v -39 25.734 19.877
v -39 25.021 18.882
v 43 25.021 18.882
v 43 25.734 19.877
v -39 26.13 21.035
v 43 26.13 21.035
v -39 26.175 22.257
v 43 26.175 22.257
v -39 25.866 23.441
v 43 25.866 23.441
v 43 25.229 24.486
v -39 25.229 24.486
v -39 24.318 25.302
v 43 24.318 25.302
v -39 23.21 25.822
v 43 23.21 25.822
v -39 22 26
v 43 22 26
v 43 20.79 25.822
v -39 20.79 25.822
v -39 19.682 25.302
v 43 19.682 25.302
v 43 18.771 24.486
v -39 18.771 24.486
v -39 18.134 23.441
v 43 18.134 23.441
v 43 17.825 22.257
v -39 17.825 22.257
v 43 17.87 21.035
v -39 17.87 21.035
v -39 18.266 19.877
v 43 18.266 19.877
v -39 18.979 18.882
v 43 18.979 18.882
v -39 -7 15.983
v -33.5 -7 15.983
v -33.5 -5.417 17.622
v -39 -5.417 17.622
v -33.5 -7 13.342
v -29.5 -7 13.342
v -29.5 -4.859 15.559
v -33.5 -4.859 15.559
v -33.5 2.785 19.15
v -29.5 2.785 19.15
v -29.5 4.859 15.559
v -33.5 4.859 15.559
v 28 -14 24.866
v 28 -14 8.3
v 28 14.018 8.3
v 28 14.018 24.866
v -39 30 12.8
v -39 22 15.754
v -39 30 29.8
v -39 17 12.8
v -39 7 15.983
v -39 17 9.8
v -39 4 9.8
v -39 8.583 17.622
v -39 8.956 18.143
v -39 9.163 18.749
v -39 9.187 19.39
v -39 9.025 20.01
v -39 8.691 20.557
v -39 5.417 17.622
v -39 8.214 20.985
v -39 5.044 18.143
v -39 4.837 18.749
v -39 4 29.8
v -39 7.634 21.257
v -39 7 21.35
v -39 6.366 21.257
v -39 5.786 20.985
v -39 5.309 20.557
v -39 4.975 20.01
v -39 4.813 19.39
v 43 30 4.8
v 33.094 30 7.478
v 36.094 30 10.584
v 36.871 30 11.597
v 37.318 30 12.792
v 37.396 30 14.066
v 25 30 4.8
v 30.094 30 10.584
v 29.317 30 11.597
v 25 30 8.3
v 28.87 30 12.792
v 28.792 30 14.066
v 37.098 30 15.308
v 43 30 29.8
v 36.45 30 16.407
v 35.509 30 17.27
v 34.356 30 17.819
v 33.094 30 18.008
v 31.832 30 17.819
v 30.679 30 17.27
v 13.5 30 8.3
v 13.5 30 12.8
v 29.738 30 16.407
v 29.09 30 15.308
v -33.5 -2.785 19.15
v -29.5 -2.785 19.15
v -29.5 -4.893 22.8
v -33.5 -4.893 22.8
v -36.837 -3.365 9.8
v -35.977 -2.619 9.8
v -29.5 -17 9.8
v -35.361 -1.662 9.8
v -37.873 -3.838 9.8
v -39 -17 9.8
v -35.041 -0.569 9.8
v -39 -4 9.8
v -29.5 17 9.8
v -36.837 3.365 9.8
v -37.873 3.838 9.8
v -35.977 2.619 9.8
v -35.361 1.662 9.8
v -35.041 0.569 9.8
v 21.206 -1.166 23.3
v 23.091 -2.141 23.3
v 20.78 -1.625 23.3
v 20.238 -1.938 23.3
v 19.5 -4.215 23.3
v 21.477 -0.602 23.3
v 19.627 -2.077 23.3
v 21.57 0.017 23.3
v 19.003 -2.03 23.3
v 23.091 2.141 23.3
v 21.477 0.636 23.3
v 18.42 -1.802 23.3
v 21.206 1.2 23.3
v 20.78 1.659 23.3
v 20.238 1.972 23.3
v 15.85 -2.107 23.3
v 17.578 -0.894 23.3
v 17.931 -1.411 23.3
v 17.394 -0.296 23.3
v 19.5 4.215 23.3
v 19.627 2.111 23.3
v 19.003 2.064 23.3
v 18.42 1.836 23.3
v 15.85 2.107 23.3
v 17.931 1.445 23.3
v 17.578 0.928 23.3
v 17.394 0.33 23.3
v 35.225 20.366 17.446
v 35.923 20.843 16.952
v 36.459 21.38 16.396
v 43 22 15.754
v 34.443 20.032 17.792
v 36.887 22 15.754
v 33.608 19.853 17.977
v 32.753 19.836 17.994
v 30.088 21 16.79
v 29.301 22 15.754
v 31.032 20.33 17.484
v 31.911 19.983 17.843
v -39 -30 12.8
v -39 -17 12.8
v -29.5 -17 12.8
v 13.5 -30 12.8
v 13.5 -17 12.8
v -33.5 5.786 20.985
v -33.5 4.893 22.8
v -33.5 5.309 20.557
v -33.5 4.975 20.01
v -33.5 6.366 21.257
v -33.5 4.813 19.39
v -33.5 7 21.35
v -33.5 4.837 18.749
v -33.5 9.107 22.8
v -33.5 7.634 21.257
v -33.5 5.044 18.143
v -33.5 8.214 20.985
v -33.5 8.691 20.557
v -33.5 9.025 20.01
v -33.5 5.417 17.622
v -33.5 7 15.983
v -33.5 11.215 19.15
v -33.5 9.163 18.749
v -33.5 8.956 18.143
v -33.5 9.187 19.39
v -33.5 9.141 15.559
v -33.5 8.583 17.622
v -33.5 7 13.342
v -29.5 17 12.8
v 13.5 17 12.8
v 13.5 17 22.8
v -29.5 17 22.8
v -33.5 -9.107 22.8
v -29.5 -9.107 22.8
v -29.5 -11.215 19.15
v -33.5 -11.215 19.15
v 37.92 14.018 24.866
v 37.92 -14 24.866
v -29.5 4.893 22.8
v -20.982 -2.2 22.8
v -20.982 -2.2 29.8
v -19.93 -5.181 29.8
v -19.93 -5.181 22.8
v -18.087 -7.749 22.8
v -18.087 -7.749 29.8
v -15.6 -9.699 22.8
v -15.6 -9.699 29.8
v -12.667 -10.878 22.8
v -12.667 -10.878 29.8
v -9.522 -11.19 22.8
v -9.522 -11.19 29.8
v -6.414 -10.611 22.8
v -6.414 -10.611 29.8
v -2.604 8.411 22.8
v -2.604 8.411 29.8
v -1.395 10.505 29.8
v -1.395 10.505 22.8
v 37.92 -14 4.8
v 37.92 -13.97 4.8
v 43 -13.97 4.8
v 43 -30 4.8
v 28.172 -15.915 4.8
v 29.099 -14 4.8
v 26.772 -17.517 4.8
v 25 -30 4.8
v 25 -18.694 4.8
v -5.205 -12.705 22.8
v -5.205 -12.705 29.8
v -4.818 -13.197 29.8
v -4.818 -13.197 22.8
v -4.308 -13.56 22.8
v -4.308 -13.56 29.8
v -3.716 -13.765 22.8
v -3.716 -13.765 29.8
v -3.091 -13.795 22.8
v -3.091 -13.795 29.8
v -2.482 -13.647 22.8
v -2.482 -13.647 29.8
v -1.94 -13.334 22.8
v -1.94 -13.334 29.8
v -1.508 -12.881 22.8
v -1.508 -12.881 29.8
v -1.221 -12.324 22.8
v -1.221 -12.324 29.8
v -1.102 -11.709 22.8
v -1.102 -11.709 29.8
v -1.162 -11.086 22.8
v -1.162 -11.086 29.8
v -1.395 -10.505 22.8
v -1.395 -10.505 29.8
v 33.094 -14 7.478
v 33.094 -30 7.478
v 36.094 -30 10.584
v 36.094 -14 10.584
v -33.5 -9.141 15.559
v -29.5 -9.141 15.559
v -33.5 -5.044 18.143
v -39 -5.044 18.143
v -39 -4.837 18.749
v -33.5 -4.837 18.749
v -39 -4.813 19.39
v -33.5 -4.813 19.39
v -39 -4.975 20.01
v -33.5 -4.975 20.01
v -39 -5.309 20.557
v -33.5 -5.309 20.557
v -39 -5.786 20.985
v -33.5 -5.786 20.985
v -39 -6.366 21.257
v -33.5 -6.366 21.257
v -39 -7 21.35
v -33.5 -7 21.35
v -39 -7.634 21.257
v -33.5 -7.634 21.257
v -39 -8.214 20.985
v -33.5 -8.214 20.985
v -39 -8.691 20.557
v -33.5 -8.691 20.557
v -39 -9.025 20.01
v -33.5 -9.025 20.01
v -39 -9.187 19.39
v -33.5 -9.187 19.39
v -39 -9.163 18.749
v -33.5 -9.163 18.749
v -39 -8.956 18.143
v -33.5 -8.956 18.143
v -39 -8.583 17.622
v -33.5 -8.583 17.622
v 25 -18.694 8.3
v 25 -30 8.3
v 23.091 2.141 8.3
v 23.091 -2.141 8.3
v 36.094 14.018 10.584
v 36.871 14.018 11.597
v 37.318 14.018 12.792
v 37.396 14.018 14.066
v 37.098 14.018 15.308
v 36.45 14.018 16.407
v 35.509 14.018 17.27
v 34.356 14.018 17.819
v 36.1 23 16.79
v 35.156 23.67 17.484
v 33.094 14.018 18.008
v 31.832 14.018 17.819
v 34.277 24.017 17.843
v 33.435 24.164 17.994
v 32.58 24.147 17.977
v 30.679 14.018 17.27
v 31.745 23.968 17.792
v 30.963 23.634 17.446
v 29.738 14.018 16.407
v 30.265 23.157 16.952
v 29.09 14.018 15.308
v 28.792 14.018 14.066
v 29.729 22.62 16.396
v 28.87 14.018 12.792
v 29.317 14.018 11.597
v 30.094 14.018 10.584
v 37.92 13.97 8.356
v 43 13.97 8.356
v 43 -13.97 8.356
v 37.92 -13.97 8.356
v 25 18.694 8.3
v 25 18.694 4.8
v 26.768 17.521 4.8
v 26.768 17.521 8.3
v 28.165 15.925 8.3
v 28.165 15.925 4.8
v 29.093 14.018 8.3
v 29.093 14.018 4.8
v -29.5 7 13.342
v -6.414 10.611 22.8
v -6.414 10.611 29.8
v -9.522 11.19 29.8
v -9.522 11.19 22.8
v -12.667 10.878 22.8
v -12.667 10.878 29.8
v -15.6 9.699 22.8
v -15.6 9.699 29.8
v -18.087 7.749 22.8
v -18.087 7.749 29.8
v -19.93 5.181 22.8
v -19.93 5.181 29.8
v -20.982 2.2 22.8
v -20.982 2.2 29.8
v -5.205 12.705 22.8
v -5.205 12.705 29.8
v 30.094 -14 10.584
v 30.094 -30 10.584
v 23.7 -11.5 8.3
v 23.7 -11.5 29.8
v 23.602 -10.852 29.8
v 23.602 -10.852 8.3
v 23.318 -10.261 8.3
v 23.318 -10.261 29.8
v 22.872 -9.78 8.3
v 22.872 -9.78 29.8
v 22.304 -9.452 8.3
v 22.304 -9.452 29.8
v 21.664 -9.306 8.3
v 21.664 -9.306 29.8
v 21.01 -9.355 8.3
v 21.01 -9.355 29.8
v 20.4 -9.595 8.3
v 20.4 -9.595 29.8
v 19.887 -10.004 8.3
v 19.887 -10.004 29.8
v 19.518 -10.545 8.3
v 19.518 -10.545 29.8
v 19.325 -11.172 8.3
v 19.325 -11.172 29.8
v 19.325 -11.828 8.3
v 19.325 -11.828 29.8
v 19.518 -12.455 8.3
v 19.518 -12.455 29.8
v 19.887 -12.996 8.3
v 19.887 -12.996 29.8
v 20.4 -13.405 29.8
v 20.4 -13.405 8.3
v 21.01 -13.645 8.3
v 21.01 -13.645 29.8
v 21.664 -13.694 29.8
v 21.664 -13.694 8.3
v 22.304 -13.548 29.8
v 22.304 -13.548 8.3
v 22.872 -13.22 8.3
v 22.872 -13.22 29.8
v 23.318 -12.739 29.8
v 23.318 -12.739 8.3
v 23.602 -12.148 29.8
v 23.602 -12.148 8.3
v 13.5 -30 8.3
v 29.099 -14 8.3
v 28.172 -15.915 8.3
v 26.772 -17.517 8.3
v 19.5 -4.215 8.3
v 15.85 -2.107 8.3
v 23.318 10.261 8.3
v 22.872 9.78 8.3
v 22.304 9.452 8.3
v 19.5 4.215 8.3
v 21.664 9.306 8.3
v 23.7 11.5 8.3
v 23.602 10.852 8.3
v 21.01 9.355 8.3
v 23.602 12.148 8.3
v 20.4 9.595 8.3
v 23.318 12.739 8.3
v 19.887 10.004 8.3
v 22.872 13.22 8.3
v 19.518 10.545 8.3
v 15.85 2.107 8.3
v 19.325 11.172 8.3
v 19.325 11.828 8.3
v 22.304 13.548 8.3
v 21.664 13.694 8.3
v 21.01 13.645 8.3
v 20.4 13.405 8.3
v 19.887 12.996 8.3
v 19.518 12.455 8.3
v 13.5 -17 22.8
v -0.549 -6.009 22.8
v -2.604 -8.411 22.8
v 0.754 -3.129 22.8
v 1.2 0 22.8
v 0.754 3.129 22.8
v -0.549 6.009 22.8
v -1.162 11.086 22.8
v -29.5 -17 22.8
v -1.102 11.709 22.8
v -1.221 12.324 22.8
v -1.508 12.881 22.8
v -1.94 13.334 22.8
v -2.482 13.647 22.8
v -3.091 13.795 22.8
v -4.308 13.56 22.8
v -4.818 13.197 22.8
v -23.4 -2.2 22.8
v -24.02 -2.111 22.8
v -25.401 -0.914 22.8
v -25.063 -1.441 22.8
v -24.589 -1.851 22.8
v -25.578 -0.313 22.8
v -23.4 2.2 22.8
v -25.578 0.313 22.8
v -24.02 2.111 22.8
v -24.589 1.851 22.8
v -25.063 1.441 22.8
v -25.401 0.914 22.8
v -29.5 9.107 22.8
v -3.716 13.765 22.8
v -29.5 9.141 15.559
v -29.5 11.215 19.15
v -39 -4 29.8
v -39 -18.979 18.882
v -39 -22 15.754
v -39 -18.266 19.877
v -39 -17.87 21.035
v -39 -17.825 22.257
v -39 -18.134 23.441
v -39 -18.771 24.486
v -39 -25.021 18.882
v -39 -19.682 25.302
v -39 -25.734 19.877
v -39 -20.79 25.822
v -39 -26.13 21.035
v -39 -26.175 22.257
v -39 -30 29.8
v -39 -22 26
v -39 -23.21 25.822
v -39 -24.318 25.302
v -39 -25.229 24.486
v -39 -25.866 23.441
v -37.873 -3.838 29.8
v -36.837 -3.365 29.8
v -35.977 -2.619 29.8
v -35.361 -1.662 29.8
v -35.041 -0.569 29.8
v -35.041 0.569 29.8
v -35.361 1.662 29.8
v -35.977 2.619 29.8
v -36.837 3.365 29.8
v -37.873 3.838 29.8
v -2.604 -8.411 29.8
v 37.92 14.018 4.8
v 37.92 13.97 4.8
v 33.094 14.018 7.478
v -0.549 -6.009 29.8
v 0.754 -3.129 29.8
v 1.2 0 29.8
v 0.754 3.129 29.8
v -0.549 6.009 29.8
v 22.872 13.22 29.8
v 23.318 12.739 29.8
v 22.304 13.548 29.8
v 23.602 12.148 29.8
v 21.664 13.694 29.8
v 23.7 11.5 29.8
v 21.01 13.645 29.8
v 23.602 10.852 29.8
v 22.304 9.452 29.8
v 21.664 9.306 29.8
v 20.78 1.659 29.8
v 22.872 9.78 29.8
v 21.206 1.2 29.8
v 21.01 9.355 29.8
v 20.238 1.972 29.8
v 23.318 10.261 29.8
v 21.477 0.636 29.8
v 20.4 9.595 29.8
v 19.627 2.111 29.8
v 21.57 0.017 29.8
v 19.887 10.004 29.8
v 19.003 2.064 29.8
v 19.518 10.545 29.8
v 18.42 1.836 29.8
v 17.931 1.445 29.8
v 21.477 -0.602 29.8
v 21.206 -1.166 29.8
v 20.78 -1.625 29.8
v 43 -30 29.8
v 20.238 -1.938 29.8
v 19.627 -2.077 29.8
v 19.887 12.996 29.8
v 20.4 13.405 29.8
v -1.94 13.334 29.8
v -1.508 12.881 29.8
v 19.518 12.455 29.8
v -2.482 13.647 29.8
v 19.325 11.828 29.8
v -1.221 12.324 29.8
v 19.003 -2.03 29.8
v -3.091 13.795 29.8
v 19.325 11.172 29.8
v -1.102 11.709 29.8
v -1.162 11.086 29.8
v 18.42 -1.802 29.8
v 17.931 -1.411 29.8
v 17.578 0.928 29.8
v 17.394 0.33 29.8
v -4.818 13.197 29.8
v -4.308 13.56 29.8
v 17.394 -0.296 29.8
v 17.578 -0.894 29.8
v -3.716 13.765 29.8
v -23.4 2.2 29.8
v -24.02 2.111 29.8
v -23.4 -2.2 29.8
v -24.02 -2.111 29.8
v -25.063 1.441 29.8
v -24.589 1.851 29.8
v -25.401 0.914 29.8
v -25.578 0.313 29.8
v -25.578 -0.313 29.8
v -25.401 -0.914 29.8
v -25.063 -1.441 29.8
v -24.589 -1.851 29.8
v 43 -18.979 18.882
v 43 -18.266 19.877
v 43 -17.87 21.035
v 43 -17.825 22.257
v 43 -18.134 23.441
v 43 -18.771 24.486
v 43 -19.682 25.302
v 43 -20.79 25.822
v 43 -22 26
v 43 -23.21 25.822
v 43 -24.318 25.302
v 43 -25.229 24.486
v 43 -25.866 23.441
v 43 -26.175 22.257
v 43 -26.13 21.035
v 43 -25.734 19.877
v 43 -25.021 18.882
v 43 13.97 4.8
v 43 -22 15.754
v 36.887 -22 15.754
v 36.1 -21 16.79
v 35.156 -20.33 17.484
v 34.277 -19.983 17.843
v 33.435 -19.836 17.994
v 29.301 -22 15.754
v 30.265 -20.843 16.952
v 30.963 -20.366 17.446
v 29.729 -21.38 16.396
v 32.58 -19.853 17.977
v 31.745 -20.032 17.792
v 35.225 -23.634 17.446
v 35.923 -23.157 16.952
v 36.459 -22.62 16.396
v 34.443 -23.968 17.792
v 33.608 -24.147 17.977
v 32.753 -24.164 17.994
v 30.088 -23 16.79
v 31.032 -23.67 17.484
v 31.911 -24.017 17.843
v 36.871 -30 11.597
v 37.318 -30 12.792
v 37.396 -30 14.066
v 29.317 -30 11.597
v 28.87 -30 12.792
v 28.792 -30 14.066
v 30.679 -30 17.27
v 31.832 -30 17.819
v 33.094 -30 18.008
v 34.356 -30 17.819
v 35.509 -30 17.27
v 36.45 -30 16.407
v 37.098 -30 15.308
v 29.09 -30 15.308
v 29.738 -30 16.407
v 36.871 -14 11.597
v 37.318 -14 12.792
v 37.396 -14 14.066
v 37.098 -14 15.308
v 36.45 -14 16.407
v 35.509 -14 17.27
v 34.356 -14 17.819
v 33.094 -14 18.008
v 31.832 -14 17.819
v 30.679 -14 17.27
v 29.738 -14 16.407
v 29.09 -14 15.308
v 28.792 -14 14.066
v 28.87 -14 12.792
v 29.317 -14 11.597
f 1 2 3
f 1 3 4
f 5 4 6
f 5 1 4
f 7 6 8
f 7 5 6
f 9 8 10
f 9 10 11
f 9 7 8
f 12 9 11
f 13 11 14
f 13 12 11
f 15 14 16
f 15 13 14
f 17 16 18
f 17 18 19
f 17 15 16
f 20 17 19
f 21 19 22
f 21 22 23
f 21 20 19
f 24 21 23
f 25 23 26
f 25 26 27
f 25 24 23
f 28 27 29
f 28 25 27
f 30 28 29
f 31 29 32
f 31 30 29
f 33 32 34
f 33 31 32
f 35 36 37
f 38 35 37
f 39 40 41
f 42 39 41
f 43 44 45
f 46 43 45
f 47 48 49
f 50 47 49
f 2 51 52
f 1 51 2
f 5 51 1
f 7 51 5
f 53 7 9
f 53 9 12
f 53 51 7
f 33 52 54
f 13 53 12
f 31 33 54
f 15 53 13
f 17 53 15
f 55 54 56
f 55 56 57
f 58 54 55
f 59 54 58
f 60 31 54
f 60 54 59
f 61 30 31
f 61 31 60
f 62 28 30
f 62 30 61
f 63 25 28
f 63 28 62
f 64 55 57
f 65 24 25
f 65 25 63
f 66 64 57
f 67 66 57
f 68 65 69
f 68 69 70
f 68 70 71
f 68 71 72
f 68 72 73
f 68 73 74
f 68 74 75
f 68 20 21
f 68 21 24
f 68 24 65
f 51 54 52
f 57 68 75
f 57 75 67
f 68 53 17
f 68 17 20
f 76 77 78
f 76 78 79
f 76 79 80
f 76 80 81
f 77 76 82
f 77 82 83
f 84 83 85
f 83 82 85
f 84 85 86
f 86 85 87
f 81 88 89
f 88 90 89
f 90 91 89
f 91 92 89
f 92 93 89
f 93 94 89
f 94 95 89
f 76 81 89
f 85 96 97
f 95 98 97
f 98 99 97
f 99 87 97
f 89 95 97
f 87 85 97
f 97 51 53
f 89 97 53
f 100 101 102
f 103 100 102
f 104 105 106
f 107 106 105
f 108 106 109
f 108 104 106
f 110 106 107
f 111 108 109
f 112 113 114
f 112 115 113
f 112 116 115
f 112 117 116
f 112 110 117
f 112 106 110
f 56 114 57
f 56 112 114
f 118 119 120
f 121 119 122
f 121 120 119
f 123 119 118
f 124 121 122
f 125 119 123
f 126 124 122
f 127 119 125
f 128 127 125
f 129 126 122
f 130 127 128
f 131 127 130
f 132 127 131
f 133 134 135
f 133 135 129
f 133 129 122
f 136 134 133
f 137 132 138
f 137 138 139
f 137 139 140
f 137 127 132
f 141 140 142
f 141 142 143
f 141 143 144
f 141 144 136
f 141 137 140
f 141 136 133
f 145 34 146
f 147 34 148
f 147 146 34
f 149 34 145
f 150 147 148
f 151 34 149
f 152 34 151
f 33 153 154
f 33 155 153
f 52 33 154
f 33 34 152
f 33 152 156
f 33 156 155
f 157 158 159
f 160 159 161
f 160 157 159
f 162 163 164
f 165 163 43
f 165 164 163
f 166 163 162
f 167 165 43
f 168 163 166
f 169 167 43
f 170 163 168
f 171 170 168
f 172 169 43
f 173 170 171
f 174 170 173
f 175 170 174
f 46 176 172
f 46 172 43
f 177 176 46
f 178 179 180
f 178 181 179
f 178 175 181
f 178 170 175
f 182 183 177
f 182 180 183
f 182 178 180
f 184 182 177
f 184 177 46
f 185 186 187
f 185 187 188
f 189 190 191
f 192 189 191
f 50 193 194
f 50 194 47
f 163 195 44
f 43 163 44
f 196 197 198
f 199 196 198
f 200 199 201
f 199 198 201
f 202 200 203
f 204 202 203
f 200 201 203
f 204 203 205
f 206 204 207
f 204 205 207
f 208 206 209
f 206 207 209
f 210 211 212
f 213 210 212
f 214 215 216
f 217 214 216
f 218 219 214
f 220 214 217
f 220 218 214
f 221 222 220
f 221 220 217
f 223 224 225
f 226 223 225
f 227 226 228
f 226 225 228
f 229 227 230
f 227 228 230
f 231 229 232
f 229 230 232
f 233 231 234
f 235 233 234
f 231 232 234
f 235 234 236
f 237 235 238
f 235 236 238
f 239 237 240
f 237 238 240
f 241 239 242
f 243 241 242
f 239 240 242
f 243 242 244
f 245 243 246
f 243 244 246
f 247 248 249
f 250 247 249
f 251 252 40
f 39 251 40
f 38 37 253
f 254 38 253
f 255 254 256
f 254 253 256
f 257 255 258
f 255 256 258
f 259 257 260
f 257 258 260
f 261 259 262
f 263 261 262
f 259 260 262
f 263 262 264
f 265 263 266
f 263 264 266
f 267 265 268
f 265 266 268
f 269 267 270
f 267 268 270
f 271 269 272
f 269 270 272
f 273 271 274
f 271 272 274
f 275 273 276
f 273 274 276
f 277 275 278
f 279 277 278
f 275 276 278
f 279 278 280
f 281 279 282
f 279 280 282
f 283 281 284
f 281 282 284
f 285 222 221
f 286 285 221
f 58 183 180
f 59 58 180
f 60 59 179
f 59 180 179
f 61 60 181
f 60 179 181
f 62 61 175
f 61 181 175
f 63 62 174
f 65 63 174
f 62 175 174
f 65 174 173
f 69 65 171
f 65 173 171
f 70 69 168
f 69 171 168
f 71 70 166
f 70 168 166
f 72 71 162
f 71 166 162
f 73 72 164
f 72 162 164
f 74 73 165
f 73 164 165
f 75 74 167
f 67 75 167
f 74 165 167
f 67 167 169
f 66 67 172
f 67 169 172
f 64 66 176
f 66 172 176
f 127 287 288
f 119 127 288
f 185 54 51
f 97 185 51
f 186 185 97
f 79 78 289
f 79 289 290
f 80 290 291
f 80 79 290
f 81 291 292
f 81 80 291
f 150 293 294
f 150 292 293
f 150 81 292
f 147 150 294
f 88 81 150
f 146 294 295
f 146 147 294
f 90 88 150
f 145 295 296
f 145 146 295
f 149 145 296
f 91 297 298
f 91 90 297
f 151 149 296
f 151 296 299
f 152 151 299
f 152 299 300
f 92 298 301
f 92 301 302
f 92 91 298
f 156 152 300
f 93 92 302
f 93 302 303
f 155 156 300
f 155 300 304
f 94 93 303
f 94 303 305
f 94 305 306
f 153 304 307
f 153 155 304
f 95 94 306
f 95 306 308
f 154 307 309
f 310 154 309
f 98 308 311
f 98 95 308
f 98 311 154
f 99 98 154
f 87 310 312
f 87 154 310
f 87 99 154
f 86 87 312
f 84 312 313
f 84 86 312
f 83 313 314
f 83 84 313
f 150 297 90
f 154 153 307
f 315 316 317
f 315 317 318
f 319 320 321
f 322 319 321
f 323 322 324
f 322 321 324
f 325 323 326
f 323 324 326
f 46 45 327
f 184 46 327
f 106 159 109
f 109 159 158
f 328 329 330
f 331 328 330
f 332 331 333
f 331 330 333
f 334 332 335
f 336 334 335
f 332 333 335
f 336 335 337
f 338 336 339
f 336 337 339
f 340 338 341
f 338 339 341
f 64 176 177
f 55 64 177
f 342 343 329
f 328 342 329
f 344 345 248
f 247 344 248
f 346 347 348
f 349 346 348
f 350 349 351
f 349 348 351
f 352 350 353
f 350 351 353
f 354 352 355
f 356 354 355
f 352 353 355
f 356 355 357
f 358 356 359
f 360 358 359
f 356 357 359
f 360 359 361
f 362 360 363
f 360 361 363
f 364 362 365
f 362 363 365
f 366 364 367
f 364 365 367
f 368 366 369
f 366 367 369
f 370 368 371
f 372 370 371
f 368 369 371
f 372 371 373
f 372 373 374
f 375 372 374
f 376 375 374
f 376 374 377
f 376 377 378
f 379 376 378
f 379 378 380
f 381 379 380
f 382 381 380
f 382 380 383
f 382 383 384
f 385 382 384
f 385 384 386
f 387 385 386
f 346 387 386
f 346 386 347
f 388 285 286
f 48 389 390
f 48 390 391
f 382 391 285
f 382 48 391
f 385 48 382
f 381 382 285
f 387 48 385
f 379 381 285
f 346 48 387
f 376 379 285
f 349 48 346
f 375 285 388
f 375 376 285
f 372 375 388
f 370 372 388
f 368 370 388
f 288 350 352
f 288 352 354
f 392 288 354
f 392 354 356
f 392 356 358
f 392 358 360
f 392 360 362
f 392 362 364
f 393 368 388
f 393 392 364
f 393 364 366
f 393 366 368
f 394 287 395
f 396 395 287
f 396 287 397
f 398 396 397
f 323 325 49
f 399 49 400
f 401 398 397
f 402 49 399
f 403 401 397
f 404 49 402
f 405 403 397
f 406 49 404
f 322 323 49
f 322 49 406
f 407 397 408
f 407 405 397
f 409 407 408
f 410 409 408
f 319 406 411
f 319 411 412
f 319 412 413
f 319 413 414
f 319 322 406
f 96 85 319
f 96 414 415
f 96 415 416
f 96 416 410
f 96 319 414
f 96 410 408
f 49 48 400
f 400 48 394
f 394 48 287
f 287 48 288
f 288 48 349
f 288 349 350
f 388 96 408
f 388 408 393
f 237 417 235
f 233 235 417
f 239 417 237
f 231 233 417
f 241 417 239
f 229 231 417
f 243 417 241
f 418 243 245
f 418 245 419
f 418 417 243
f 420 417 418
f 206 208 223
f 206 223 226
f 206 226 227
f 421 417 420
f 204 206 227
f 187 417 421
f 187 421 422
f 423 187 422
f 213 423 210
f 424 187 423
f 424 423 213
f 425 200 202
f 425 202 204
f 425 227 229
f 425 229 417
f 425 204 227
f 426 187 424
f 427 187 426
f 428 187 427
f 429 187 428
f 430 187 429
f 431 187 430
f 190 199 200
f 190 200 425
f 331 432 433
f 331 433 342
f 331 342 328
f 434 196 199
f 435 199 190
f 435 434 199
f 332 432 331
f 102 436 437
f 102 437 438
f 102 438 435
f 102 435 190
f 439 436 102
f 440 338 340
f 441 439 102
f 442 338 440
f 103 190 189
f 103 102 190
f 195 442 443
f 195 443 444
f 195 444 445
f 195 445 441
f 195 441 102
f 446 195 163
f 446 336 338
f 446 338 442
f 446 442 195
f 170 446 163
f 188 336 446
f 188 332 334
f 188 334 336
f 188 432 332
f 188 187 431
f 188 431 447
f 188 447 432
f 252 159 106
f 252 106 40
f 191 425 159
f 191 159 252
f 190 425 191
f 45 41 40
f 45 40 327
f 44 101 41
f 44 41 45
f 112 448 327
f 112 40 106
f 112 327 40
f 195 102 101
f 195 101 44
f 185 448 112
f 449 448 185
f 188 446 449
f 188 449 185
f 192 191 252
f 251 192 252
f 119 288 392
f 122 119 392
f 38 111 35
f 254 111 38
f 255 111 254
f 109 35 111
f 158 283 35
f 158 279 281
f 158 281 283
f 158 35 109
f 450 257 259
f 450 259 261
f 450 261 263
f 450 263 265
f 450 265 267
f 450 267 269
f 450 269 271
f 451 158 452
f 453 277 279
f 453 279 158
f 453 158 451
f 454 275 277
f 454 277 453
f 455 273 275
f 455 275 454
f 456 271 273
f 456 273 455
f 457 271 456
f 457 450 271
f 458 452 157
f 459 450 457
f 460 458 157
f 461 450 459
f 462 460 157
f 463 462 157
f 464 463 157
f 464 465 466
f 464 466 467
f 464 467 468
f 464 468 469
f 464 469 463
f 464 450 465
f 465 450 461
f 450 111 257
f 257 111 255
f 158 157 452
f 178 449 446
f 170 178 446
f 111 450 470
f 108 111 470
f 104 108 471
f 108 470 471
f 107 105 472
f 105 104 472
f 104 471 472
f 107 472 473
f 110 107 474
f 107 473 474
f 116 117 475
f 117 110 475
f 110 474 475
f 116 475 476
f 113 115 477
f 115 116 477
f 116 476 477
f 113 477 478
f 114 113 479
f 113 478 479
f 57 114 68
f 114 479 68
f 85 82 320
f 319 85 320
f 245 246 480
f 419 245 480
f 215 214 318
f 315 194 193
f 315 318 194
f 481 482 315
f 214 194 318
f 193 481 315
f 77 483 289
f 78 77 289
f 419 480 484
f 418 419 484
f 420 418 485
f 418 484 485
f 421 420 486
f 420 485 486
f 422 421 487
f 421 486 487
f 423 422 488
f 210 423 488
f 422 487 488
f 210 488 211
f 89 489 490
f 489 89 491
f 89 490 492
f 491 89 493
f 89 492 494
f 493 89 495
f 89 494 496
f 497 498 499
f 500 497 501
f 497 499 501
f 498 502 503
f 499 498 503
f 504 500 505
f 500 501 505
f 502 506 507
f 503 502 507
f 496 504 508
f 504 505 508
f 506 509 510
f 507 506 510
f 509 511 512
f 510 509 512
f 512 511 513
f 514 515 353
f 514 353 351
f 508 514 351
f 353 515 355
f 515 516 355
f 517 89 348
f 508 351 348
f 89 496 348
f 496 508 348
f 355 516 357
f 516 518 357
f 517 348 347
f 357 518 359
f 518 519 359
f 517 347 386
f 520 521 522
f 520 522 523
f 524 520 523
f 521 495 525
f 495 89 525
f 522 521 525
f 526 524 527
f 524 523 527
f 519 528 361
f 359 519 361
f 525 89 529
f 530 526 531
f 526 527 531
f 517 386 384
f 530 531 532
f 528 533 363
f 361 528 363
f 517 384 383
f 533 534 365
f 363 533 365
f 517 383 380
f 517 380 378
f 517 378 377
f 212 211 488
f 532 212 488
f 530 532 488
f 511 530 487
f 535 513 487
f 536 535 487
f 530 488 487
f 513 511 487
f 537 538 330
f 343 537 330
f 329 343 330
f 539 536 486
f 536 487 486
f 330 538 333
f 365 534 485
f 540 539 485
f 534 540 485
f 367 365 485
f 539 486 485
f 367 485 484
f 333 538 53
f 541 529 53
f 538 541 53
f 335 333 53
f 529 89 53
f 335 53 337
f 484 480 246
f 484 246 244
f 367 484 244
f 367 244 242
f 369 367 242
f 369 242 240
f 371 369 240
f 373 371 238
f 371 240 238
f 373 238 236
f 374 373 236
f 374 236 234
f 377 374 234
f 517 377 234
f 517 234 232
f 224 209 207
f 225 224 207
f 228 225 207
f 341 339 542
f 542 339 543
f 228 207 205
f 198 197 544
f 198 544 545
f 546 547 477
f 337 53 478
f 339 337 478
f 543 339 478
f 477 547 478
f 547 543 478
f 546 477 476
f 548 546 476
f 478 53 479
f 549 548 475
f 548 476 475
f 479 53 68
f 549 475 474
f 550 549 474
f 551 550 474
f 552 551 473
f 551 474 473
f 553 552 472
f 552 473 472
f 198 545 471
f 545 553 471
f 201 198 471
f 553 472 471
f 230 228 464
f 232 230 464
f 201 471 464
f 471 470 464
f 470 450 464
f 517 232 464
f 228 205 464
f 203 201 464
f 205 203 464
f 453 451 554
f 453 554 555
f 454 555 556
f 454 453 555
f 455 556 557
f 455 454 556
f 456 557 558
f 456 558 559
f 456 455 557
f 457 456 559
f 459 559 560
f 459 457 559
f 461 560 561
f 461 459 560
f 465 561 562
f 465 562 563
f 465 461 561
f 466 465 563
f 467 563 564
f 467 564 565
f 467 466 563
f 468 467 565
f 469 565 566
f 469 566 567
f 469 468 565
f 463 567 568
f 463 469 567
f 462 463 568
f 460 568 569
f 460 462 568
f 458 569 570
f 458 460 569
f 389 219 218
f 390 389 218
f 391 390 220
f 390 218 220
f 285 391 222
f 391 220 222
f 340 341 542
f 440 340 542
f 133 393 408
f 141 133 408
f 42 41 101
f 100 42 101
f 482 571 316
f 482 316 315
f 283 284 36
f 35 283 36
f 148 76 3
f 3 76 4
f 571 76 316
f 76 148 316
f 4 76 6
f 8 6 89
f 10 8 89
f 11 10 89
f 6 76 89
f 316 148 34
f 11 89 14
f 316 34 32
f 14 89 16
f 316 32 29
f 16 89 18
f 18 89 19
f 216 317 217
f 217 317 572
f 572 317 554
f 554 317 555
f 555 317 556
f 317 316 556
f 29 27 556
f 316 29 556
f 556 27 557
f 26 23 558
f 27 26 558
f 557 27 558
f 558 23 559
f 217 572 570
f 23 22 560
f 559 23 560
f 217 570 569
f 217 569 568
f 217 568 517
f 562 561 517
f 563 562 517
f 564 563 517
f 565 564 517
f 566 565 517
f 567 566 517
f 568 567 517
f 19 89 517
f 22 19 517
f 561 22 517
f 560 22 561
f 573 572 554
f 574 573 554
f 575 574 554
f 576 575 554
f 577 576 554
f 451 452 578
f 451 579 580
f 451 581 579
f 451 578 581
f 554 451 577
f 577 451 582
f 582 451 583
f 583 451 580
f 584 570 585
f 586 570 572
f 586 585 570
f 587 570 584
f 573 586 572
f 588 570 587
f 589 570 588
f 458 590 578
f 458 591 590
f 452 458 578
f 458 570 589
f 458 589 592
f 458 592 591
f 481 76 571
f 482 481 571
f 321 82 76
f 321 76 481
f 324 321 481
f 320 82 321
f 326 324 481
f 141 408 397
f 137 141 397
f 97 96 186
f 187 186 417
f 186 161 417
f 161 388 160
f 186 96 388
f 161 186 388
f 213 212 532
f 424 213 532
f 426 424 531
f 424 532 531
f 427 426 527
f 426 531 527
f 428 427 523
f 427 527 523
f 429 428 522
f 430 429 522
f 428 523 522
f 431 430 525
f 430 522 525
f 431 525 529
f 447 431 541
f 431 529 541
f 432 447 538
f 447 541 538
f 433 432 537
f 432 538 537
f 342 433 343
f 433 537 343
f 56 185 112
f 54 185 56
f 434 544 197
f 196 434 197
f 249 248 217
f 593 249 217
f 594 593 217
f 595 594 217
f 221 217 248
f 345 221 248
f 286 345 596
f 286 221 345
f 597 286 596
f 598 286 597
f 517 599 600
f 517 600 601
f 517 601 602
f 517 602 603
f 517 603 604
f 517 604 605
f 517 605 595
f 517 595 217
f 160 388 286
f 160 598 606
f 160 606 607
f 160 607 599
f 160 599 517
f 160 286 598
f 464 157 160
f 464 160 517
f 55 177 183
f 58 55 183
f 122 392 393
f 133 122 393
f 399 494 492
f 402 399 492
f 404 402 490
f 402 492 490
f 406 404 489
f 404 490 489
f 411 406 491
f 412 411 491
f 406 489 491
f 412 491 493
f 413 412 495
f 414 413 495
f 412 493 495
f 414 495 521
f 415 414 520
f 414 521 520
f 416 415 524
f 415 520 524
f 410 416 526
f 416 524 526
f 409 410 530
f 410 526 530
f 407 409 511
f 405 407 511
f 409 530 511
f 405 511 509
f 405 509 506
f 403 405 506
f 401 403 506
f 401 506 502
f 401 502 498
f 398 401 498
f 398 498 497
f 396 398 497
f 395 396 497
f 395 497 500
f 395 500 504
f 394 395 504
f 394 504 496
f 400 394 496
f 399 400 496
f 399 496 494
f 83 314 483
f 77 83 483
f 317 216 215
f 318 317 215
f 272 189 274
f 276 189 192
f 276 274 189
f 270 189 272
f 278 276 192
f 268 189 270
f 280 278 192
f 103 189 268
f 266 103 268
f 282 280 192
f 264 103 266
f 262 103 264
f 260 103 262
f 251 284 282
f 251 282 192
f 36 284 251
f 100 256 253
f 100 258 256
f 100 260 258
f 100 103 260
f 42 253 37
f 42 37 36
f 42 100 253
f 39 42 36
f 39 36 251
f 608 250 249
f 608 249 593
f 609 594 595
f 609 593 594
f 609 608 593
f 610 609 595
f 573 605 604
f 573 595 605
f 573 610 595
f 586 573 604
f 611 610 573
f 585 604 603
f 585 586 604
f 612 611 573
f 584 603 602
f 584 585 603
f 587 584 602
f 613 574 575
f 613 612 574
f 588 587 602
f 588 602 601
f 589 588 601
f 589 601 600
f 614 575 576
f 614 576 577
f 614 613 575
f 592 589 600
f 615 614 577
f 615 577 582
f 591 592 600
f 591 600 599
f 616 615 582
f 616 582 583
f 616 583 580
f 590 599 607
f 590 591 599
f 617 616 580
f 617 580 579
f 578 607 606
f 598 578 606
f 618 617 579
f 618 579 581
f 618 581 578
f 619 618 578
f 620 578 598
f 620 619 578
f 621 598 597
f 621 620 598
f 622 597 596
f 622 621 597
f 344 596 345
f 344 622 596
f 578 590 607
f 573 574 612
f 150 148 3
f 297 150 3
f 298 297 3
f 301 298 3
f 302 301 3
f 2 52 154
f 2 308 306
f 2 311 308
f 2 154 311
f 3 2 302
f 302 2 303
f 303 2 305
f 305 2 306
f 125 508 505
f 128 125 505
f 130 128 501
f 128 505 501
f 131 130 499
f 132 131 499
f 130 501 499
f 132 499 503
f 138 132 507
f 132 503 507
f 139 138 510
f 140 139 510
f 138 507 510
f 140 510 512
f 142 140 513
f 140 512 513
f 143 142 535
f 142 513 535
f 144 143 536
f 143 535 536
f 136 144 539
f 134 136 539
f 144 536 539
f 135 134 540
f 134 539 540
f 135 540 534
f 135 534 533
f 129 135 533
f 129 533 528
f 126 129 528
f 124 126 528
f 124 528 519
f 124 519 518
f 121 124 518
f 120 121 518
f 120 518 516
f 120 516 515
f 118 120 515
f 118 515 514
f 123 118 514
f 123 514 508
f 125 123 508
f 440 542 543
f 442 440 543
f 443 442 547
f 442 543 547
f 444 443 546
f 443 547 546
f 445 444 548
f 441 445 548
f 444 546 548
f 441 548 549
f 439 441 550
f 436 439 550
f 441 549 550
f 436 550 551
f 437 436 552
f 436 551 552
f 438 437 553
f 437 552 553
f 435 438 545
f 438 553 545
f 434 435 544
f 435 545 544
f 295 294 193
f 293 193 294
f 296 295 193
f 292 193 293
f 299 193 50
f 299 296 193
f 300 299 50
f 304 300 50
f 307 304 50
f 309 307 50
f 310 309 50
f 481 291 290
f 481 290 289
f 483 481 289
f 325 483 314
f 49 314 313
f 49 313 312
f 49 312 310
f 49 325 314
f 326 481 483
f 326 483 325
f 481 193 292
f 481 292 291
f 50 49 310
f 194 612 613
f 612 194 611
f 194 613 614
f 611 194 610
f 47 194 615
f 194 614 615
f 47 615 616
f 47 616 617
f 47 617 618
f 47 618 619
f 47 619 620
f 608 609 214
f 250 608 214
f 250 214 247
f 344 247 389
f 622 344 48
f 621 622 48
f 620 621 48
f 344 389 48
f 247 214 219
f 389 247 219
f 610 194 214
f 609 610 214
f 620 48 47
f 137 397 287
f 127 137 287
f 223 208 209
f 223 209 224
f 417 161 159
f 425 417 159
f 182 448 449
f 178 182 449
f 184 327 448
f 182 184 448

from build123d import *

# Parameters (mm, degrees)
SKETCH1_W           = 60
SKETCH1_H           = 25
BOSS_EXTRUDE1_DEPTH = 82
CUT_EXTRUDE7_DEPTH  = 3.5
SKETCH50_W          = 52.5
SKETCH50_H          = 4.5
CUT_EXTRUDE9_DEPTH  = 80.605527446
SKETCH51_W          = 9.5
SKETCH51_H          = 34
BOSS_EXTRUDE2_DEPTH = 3
SKETCH52_W          = 43
SKETCH52_H          = 34
CUT_EXTRUDE10_DEPTH = 10
CUT_EXTRUDE11_DEPTH = 4
CUT_EXTRUDE12_DEPTH = 4
CUT_EXTRUDE13_DEPTH = 3.5
CUT_EXTRUDE14_DEPTH = 3.5
CUT_EXTRUDE15_DEPTH = 88.408752422
CUT_EXTRUDE16_DEPTH = 59.086142926
CUT_EXTRUDE17_DEPTH = 88.408752422
CUT_EXTRUDE18_DEPTH = 15
HOLE1_D             = 4.2
HOLE2_D             = 4.4
HOLE3_D             = 4.4
HOLE4_D             = 8
SKETCH125_W         = 5.08
SKETCH125_H         = 27.94
CUT_EXTRUDE19_DEPTH = 3.556
SKETCH126_W         = 9.92
SKETCH126_H         = 28.017689761
CUT_EXTRUDE20_DEPTH = 20.066
CUT_EXTRUDE21_DEPTH = 80.605527446


with BuildPart() as part:
    # Sketch1 → Boss-Extrude1 (new body)
    with BuildSketch(Plane(origin=(-39, 0, 0), x_dir=(0, -1, 0), z_dir=(-1, 0, 0))):
        with Locations((0, 17.3)):
            Rectangle(SKETCH1_W, SKETCH1_H)
        with BuildLine():
            Line((22, 15.753862534), (18.978772839, 18.882434844))
            ThreePointArc((18.978772839, 18.882434844), (22, 26), (25.021227161, 18.882434844))
            Line((25.021227161, 18.882434844), (22, 15.753862534))
        make_face(mode=Mode.SUBTRACT)
        with BuildLine():
            Line((-18.978772839, 18.882434844), (-22, 15.753862534))
            Line((-22, 15.753862534), (-25.021227161, 18.882434844))
            ThreePointArc((-25.021227161, 18.882434844), (-22, 26), (-18.978772839, 18.882434844))
        make_face(mode=Mode.SUBTRACT)
    extrude(amount=-BOSS_EXTRUDE1_DEPTH)

    # Sketch39 → Cut-Extrude7 (cut)
    with BuildSketch(Plane(origin=(0, 0, 4.8), x_dir=(-1, 0, 0), z_dir=(0, 0, -1))):
        Polygon((-28, 14), (-28, -14), (-25, -14), (-25, -30), (39, -30), (39, 30), (-25, 30), (-25, 14), align=None)
    extrude(amount=-CUT_EXTRUDE7_DEPTH, mode=Mode.SUBTRACT)

    # Sketch50 → Cut-Extrude9 (cut, through all)
    with BuildSketch(Plane.XZ.offset(30)):
        with Locations((-12.75, 10.55)):
            Rectangle(SKETCH50_W, SKETCH50_H)
    extrude(amount=-CUT_EXTRUDE9_DEPTH, mode=Mode.SUBTRACT)

    # Sketch51 → Boss-Extrude2 (add)
    with BuildSketch(Plane(origin=(0, 0, 12.8), x_dir=(-1, 0, 0), z_dir=(0, 0, -1))):
        with Locations((34.25, 0)):
            Rectangle(SKETCH51_W, SKETCH51_H)
    extrude(amount=BOSS_EXTRUDE2_DEPTH)

    # Sketch52 → Cut-Extrude10 (cut)
    with BuildSketch(Plane(origin=(0, 0, 12.8), x_dir=(-1, 0, 0), z_dir=(0, 0, -1))):
        with Locations((8, 0)):
            Rectangle(SKETCH52_W, SKETCH52_H)
    extrude(amount=-CUT_EXTRUDE10_DEPTH, mode=Mode.SUBTRACT)

    # Sketch63 → Cut-Extrude11 (cut)
    with BuildSketch(Plane(origin=(-29.5, 0, 0), x_dir=(0, 0, -1), z_dir=(1, 0, 0))):
        Polygon((-22.8, 4.892671517), (-19.15, 2.785343035), (-15.559049818, 4.858579089), (-13.34154355, 7), (-15.559049818, 9.141420911), (-19.15, 11.214656965), (-22.8, 9.107328483), align=None)
    extrude(amount=-CUT_EXTRUDE11_DEPTH, mode=Mode.SUBTRACT)

    # Sketch75 → Cut-Extrude12 (cut)
    with BuildSketch(Plane(origin=(-29.5, 0, 0), x_dir=(0, 0, -1), z_dir=(1, 0, 0))):
        Polygon((-15.559049818, -4.858579089), (-19.15, -2.785343035), (-22.8, -4.892671517), (-22.8, -9.107328483), (-19.15, -11.214656965), (-15.559049818, -9.141420911), (-13.34154355, -7), align=None)
    extrude(amount=-CUT_EXTRUDE12_DEPTH, mode=Mode.SUBTRACT)

    # Sketch76 → Cut-Extrude13 (cut)
    with BuildSketch(Plane(origin=(0, 0, 4.8), x_dir=(-1, 0, 0), z_dir=(0, 0, -1))):
        with BuildLine():
            Line((-25, -18.693747285), (-25, -14))
            Line((-25, -14), (-29.099342077, -14))
            ThreePointArc((-29.099342077, -14), (-27.525501185, -16.762445769), (-25, -18.693747285))
        make_face()
    extrude(amount=-CUT_EXTRUDE13_DEPTH, mode=Mode.SUBTRACT)

    # Sketch77 → Cut-Extrude14 (cut)
    with BuildSketch(Plane(origin=(0, 0, 4.8), x_dir=(-1, 0, 0), z_dir=(0, 0, -1))):
        with BuildLine():
            Line((-29.099342077, 14), (-25, 14))
            Line((-25, 14), (-25, 18.693747285))
            ThreePointArc((-25, 18.693747285), (-27.525501185, 16.762445769), (-29.099342077, 14))
        make_face()
    extrude(amount=-CUT_EXTRUDE14_DEPTH, mode=Mode.SUBTRACT)

    # Sketch89 → Cut-Extrude15 (cut, through all)
    with BuildSketch(Plane(origin=(-33.5, 0, 0), x_dir=(0, 0, -1), z_dir=(1, 0, 0))):
        with BuildLine():
            Line((-15.982975613, 7), (-17.621751585, 8.582547561))
            ThreePointArc((-17.621751585, 8.582547561), (-21.35, 7), (-17.621751585, 5.417452439))
            Line((-17.621751585, 5.417452439), (-15.982975613, 7))
        make_face()
    extrude(amount=-CUT_EXTRUDE15_DEPTH, mode=Mode.SUBTRACT)

    # Sketch90 → Cut-Extrude16 (cut, through all)
    with BuildSketch(Plane.XY.offset(29.8)):
        with BuildLine():
            Line((-23.4, -2.2), (-20.981803131, -2.2))
            ThreePointArc((-20.981803131, -2.2), (-15.6, -9.699484522), (-6.414354323, -10.61052049))
            Line((-6.414354323, -10.61052049), (-5.205255888, -12.704740411))
            ThreePointArc((-5.205255888, -12.704740411), (-2.2, -13.509996299), (-1.394744112, -10.504740411))
            Line((-1.394744112, -10.504740411), (-2.603842546, -8.41052049))
            ThreePointArc((-2.603842546, -8.41052049), (1.2, 0), (-2.603842546, 8.41052049))
            Line((-2.603842546, 8.41052049), (-1.394744112, 10.504740411))
            ThreePointArc((-1.394744112, 10.504740411), (-2.2, 13.509996299), (-5.205255888, 12.704740411))
            Line((-5.205255888, 12.704740411), (-6.414354323, 10.61052049))
            ThreePointArc((-6.414354323, 10.61052049), (-15.6, 9.699484522), (-20.981803131, 2.2))
            Line((-20.981803131, 2.2), (-23.4, 2.2))
            ThreePointArc((-23.4, 2.2), (-25.6, 0), (-23.4, -2.2))
        make_face()
    extrude(amount=-CUT_EXTRUDE16_DEPTH, mode=Mode.SUBTRACT)

    # Sketch103 → Cut-Extrude17 (cut, through all)
    with BuildSketch(Plane(origin=(-33.5, 0, 0), x_dir=(0, 0, -1), z_dir=(1, 0, 0))):
        with BuildLine():
            Line((-17.621751585, -8.582547561), (-15.982975613, -7))
            Line((-15.982975613, -7), (-17.621751585, -5.417452439))
            ThreePointArc((-17.621751585, -5.417452439), (-21.35, -7), (-17.621751585, -8.582547561))
        make_face()
    extrude(amount=-CUT_EXTRUDE17_DEPTH, mode=Mode.SUBTRACT)

    # Sketch116 → Cut-Extrude18 (cut)
    with BuildSketch(Plane(origin=(0, 0, 8.3), x_dir=(-1, 0, 0), z_dir=(0, 0, -1))):
        Polygon((-19.5, 4.214656965), (-23.090950182, 2.141420911), (-23.090950182, -2.141420911), (-19.5, -4.214656965), (-15.85, -2.107328483), (-15.85, 2.107328483), align=None)
    extrude(amount=-CUT_EXTRUDE18_DEPTH, mode=Mode.SUBTRACT)

    # Hole1 (through all)
    with Locations(Plane(origin=(0, 0, 23.3), x_dir=(-1, 0, 0), z_dir=(0, 0, -1))):
        with Locations((-19.470475091, 0.017046214)):
            Hole(HOLE1_D / 2)

    # Hole2 (through all)
    with Locations(Plane(origin=(0, 0, 8.3), x_dir=(-1, 0, 0), z_dir=(0, 0, -1))):
        with Locations((-21.5, 11.5)):
            Hole(HOLE2_D / 2)

    # Hole3 (through all)
    with Locations(Plane(origin=(0, 0, 8.3), x_dir=(-1, 0, 0), z_dir=(0, 0, -1))):
        with Locations((-21.5, -11.5)):
            Hole(HOLE3_D / 2)

    # Hole4 (through all)
    with Locations(Plane(origin=(0, 0, 9.8), x_dir=(-1, 0, 0), z_dir=(0, 0, -1))):
        with Locations((39, 0)):
            Hole(HOLE4_D / 2)

    # Sketch125 → Cut-Extrude19 (cut)
    with BuildSketch(Plane(origin=(0, 0, 4.8), x_dir=(-1, 0, 0), z_dir=(0, 0, -1))):
        with Locations((-40.46, 0)):
            Rectangle(SKETCH125_W, SKETCH125_H)
    extrude(amount=-CUT_EXTRUDE19_DEPTH, mode=Mode.SUBTRACT)

    # Sketch126 → Cut-Extrude20 (cut)
    with BuildSketch(Plane(origin=(0, 0, 4.8), x_dir=(-1, 0, 0), z_dir=(0, 0, -1))):
        with Locations((-32.96, 0.008844881)):
            Rectangle(SKETCH126_W, SKETCH126_H)
    extrude(amount=-CUT_EXTRUDE20_DEPTH, mode=Mode.SUBTRACT)

    # Sketch128 → Cut-Extrude21 (cut, through all)
    with BuildSketch(Plane(origin=(0, 30, 0), x_dir=(1, 0, 0), z_dir=(0, 1, 0))):
        with BuildLine():
            Line((30.094465156, -10.583890742), (33.094, -7.477781484))
            Line((33.094, -7.477781484), (36.093534844, -10.583890742))
            ThreePointArc((36.093534844, -10.583890742), (33.094, -18.008), (30.094465156, -10.583890742))
        make_face()
    extrude(amount=-CUT_EXTRUDE21_DEPTH, mode=Mode.SUBTRACT)


solid = part.part
